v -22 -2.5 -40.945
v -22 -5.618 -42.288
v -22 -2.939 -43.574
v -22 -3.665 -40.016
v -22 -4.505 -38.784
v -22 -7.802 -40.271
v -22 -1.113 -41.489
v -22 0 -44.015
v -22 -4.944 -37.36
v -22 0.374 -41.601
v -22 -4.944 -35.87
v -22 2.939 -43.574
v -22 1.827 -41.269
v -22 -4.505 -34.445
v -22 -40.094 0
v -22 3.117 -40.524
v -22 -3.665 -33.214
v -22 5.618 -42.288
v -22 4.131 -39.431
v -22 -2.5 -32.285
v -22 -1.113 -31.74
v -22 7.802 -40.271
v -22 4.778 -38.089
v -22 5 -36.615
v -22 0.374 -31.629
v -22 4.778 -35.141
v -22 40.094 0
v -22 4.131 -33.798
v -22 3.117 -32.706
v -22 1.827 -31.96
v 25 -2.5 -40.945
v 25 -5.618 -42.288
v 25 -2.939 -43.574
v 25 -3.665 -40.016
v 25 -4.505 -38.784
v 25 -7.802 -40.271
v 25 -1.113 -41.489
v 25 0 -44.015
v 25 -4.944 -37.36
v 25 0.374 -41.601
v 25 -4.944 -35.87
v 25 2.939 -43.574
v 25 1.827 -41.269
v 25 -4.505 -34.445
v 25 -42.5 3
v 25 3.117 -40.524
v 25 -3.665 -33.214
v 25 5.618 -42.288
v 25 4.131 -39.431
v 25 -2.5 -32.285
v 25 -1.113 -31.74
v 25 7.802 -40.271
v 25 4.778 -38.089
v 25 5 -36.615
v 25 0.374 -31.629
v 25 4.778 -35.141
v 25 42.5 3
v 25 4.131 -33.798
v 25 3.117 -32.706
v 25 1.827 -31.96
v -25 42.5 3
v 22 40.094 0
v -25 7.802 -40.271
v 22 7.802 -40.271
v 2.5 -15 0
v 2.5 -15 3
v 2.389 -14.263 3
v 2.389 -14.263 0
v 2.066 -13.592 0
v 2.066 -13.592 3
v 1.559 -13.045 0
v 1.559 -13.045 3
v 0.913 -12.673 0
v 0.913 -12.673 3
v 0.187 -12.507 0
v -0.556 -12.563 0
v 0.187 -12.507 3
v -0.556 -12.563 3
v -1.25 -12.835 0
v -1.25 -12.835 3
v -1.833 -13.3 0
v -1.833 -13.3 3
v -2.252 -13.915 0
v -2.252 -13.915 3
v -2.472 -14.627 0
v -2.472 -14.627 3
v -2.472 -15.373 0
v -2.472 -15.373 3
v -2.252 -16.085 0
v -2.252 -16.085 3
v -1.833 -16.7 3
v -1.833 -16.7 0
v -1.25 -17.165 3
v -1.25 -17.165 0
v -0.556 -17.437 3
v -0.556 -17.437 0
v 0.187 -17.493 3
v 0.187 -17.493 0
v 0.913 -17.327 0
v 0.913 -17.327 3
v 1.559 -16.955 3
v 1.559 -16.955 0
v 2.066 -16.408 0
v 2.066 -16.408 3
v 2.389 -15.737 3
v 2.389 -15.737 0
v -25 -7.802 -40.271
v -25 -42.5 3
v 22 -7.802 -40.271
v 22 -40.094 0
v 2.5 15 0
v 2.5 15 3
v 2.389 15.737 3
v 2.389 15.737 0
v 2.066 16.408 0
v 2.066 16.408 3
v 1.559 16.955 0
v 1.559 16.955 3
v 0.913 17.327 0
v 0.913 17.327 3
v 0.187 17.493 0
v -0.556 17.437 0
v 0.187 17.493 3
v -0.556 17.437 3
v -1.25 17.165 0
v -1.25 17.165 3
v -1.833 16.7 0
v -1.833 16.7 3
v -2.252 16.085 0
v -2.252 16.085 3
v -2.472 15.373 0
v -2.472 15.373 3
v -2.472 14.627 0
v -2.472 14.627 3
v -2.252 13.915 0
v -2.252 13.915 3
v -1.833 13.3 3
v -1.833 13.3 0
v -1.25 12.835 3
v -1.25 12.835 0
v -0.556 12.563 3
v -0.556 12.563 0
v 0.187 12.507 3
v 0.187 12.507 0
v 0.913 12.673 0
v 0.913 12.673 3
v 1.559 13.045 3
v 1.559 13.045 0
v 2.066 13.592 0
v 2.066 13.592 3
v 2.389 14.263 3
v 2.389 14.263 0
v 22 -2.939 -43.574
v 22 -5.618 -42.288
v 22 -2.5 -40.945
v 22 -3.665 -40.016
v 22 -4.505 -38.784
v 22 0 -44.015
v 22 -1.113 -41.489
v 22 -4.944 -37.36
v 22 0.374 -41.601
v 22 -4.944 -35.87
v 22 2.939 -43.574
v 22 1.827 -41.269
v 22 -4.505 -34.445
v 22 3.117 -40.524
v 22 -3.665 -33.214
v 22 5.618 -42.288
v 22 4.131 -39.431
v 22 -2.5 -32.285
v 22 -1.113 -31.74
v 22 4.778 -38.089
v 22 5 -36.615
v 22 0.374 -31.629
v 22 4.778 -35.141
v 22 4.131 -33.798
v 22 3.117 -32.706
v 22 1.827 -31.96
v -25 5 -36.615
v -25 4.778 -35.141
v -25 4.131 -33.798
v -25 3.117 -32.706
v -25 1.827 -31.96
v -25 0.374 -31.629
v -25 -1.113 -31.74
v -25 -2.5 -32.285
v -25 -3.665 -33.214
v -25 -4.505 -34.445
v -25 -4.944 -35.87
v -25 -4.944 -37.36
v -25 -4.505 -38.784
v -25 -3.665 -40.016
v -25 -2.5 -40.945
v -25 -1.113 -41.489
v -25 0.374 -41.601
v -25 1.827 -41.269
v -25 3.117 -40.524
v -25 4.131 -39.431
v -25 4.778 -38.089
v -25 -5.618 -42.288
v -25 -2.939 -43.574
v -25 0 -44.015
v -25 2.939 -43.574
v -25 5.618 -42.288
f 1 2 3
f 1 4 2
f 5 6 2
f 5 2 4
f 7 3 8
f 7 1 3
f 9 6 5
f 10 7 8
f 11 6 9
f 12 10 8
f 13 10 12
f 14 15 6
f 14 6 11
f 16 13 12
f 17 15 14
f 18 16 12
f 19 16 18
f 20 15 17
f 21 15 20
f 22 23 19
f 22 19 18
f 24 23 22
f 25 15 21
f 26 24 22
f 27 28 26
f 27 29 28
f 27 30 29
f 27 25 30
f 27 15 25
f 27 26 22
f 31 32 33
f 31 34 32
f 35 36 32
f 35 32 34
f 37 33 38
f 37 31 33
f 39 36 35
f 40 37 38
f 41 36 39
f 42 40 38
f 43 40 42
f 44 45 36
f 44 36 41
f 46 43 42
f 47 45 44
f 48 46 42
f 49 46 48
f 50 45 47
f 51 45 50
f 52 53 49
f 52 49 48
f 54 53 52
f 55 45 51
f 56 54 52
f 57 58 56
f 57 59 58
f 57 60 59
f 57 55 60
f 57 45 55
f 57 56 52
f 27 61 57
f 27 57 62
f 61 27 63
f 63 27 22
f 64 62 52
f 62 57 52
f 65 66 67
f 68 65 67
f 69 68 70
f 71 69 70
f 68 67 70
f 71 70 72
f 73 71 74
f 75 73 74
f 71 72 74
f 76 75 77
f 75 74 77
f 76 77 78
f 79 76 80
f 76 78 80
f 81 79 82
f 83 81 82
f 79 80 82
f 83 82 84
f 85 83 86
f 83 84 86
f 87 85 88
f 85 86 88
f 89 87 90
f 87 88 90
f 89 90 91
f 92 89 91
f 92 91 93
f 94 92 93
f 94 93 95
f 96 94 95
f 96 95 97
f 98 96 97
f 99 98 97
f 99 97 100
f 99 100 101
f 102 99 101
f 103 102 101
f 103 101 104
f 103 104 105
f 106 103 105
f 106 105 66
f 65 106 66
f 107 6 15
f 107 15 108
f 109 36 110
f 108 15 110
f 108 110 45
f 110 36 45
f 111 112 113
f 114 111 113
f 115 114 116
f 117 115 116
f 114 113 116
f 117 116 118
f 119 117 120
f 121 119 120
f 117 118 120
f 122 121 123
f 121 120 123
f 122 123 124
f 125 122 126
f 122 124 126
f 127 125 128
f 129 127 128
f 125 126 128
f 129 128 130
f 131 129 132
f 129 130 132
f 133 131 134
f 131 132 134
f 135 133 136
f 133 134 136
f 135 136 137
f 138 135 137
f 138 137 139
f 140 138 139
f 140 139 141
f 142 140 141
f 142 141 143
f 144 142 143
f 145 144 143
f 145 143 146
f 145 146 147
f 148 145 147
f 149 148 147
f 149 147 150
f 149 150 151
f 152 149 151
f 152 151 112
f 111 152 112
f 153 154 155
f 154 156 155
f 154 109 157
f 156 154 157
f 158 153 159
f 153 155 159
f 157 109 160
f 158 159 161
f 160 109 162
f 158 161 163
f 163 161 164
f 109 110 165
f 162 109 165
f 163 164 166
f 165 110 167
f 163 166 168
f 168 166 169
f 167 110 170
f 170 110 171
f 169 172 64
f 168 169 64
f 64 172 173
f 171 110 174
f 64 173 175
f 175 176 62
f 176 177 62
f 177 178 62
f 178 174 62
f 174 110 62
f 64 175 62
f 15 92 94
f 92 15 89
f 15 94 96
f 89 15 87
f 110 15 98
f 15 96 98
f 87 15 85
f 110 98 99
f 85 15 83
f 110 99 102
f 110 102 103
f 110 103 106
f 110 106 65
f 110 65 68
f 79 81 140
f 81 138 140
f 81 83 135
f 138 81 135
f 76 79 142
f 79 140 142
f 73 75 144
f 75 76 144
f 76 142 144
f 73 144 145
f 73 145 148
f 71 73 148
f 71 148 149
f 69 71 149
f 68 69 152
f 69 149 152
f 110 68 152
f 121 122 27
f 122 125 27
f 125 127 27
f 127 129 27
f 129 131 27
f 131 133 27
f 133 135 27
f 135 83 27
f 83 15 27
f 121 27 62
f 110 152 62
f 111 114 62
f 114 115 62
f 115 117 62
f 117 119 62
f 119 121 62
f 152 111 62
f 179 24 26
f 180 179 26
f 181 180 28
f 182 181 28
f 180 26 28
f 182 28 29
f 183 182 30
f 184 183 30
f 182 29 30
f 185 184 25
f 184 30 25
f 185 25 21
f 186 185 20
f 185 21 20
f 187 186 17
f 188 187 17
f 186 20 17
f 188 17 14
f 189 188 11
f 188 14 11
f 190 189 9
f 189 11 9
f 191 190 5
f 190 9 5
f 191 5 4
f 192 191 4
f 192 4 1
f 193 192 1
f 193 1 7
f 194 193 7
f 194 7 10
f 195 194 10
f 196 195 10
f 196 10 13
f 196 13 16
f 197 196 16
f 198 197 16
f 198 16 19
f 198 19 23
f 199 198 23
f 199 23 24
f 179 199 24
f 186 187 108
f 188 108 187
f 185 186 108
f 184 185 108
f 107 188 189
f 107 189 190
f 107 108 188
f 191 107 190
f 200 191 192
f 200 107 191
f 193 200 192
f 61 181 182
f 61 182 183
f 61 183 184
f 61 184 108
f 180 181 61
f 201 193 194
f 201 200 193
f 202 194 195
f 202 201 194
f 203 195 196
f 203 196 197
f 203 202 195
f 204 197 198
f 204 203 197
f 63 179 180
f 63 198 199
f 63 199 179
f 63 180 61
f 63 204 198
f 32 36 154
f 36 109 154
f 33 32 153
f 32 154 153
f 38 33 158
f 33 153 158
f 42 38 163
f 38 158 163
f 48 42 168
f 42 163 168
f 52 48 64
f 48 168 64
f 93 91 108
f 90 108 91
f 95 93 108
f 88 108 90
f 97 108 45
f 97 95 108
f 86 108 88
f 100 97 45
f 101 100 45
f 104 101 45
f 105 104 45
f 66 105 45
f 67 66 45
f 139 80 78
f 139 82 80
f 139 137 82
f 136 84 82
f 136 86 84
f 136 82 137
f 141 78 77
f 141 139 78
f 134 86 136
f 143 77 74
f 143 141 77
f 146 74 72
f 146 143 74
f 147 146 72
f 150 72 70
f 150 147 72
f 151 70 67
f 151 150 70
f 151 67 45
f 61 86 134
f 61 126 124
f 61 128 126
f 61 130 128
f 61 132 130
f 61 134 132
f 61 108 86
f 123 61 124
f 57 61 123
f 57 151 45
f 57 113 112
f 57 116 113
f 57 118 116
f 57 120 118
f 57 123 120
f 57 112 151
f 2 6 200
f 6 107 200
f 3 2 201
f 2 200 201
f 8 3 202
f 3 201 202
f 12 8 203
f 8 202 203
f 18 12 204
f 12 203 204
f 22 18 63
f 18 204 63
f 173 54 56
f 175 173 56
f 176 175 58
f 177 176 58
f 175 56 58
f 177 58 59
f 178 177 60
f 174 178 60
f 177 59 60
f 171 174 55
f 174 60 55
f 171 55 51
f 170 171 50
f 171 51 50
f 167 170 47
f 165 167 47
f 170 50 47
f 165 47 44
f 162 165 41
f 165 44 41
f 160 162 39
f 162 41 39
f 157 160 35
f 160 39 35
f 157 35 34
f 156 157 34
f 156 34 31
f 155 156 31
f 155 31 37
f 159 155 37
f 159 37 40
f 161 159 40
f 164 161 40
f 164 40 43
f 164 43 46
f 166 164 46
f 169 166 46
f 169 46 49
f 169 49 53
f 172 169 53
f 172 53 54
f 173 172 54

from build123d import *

# Parameters (mm, degrees)
SKETCH1_W           = 50
SKETCH1_H           = 85
BOSS_EXTRUDE1_DEPTH = 3
SKETCH4_W           = 3
SKETCH4_H           = 85
BOSS_EXTRUDE2_DEPTH = 50
CUT_EXTRUDE1_DEPTH  = 50
FILLET2_R           = 10
SKETCH6_R           = 5
CUT_EXTRUDE2_DEPTH  = 50
SKETCH7_R           = 2.5
CUT_EXTRUDE3_DEPTH  = 20


with BuildPart() as part:
    # Sketch1 → Boss-Extrude1 (new body)
    with BuildSketch(Plane.XY):
        Rectangle(SKETCH1_W, SKETCH1_H)
    extrude(amount=BOSS_EXTRUDE1_DEPTH)

    # Sketch4 → Boss-Extrude2 (add)
    with BuildSketch(Plane(origin=(0, 0, 0), x_dir=(-1, 0, 0), z_dir=(0, 0, -1))):
        with Locations((-23.5, 0)):
            Rectangle(SKETCH4_W, SKETCH4_H)
        with Locations((23.5, 0)):
            Rectangle(SKETCH4_W, SKETCH4_H)
    extrude(amount=BOSS_EXTRUDE2_DEPTH)

    # Sketch5 → Cut-Extrude1 (cut)
    with BuildSketch(Plane(origin=(25, 0, 0), x_dir=(0, 0, -1), z_dir=(1, 0, 0))):
        Polygon((50, 0), (-3, -42.5), (50, -42.5), align=None)
        Polygon((-3, 42.5), (50, 0), (50, 42.5), align=None)
    extrude(amount=-CUT_EXTRUDE1_DEPTH, mode=Mode.SUBTRACT)

    # Fillet2
    fillet2_edges = [part.edges().sort_by_distance(p)[0] for p in [
        (23.5, 0, -50),
        (-23.5, 0, -50),
    ]]
    fillet(fillet2_edges, radius=FILLET2_R)

    # Sketch6 → Cut-Extrude2 (cut)
    with BuildSketch(Plane(origin=(25, 0, 0), x_dir=(0, 0, -1), z_dir=(1, 0, 0))):
        with Locations(Location((36.614754057, 0, 0), (0, 0, 90))):
            Circle(SKETCH6_R)
    extrude(amount=-CUT_EXTRUDE2_DEPTH, mode=Mode.SUBTRACT)

    # Sketch7 → Cut-Extrude3 (cut)
    with BuildSketch(Plane.XY.offset(3)):
        with Locations((0, 15)):
            Circle(SKETCH7_R)
        with Locations((0, -15)):
            Circle(SKETCH7_R)
    extrude(amount=-CUT_EXTRUDE3_DEPTH, mode=Mode.SUBTRACT)


solid = part.part
